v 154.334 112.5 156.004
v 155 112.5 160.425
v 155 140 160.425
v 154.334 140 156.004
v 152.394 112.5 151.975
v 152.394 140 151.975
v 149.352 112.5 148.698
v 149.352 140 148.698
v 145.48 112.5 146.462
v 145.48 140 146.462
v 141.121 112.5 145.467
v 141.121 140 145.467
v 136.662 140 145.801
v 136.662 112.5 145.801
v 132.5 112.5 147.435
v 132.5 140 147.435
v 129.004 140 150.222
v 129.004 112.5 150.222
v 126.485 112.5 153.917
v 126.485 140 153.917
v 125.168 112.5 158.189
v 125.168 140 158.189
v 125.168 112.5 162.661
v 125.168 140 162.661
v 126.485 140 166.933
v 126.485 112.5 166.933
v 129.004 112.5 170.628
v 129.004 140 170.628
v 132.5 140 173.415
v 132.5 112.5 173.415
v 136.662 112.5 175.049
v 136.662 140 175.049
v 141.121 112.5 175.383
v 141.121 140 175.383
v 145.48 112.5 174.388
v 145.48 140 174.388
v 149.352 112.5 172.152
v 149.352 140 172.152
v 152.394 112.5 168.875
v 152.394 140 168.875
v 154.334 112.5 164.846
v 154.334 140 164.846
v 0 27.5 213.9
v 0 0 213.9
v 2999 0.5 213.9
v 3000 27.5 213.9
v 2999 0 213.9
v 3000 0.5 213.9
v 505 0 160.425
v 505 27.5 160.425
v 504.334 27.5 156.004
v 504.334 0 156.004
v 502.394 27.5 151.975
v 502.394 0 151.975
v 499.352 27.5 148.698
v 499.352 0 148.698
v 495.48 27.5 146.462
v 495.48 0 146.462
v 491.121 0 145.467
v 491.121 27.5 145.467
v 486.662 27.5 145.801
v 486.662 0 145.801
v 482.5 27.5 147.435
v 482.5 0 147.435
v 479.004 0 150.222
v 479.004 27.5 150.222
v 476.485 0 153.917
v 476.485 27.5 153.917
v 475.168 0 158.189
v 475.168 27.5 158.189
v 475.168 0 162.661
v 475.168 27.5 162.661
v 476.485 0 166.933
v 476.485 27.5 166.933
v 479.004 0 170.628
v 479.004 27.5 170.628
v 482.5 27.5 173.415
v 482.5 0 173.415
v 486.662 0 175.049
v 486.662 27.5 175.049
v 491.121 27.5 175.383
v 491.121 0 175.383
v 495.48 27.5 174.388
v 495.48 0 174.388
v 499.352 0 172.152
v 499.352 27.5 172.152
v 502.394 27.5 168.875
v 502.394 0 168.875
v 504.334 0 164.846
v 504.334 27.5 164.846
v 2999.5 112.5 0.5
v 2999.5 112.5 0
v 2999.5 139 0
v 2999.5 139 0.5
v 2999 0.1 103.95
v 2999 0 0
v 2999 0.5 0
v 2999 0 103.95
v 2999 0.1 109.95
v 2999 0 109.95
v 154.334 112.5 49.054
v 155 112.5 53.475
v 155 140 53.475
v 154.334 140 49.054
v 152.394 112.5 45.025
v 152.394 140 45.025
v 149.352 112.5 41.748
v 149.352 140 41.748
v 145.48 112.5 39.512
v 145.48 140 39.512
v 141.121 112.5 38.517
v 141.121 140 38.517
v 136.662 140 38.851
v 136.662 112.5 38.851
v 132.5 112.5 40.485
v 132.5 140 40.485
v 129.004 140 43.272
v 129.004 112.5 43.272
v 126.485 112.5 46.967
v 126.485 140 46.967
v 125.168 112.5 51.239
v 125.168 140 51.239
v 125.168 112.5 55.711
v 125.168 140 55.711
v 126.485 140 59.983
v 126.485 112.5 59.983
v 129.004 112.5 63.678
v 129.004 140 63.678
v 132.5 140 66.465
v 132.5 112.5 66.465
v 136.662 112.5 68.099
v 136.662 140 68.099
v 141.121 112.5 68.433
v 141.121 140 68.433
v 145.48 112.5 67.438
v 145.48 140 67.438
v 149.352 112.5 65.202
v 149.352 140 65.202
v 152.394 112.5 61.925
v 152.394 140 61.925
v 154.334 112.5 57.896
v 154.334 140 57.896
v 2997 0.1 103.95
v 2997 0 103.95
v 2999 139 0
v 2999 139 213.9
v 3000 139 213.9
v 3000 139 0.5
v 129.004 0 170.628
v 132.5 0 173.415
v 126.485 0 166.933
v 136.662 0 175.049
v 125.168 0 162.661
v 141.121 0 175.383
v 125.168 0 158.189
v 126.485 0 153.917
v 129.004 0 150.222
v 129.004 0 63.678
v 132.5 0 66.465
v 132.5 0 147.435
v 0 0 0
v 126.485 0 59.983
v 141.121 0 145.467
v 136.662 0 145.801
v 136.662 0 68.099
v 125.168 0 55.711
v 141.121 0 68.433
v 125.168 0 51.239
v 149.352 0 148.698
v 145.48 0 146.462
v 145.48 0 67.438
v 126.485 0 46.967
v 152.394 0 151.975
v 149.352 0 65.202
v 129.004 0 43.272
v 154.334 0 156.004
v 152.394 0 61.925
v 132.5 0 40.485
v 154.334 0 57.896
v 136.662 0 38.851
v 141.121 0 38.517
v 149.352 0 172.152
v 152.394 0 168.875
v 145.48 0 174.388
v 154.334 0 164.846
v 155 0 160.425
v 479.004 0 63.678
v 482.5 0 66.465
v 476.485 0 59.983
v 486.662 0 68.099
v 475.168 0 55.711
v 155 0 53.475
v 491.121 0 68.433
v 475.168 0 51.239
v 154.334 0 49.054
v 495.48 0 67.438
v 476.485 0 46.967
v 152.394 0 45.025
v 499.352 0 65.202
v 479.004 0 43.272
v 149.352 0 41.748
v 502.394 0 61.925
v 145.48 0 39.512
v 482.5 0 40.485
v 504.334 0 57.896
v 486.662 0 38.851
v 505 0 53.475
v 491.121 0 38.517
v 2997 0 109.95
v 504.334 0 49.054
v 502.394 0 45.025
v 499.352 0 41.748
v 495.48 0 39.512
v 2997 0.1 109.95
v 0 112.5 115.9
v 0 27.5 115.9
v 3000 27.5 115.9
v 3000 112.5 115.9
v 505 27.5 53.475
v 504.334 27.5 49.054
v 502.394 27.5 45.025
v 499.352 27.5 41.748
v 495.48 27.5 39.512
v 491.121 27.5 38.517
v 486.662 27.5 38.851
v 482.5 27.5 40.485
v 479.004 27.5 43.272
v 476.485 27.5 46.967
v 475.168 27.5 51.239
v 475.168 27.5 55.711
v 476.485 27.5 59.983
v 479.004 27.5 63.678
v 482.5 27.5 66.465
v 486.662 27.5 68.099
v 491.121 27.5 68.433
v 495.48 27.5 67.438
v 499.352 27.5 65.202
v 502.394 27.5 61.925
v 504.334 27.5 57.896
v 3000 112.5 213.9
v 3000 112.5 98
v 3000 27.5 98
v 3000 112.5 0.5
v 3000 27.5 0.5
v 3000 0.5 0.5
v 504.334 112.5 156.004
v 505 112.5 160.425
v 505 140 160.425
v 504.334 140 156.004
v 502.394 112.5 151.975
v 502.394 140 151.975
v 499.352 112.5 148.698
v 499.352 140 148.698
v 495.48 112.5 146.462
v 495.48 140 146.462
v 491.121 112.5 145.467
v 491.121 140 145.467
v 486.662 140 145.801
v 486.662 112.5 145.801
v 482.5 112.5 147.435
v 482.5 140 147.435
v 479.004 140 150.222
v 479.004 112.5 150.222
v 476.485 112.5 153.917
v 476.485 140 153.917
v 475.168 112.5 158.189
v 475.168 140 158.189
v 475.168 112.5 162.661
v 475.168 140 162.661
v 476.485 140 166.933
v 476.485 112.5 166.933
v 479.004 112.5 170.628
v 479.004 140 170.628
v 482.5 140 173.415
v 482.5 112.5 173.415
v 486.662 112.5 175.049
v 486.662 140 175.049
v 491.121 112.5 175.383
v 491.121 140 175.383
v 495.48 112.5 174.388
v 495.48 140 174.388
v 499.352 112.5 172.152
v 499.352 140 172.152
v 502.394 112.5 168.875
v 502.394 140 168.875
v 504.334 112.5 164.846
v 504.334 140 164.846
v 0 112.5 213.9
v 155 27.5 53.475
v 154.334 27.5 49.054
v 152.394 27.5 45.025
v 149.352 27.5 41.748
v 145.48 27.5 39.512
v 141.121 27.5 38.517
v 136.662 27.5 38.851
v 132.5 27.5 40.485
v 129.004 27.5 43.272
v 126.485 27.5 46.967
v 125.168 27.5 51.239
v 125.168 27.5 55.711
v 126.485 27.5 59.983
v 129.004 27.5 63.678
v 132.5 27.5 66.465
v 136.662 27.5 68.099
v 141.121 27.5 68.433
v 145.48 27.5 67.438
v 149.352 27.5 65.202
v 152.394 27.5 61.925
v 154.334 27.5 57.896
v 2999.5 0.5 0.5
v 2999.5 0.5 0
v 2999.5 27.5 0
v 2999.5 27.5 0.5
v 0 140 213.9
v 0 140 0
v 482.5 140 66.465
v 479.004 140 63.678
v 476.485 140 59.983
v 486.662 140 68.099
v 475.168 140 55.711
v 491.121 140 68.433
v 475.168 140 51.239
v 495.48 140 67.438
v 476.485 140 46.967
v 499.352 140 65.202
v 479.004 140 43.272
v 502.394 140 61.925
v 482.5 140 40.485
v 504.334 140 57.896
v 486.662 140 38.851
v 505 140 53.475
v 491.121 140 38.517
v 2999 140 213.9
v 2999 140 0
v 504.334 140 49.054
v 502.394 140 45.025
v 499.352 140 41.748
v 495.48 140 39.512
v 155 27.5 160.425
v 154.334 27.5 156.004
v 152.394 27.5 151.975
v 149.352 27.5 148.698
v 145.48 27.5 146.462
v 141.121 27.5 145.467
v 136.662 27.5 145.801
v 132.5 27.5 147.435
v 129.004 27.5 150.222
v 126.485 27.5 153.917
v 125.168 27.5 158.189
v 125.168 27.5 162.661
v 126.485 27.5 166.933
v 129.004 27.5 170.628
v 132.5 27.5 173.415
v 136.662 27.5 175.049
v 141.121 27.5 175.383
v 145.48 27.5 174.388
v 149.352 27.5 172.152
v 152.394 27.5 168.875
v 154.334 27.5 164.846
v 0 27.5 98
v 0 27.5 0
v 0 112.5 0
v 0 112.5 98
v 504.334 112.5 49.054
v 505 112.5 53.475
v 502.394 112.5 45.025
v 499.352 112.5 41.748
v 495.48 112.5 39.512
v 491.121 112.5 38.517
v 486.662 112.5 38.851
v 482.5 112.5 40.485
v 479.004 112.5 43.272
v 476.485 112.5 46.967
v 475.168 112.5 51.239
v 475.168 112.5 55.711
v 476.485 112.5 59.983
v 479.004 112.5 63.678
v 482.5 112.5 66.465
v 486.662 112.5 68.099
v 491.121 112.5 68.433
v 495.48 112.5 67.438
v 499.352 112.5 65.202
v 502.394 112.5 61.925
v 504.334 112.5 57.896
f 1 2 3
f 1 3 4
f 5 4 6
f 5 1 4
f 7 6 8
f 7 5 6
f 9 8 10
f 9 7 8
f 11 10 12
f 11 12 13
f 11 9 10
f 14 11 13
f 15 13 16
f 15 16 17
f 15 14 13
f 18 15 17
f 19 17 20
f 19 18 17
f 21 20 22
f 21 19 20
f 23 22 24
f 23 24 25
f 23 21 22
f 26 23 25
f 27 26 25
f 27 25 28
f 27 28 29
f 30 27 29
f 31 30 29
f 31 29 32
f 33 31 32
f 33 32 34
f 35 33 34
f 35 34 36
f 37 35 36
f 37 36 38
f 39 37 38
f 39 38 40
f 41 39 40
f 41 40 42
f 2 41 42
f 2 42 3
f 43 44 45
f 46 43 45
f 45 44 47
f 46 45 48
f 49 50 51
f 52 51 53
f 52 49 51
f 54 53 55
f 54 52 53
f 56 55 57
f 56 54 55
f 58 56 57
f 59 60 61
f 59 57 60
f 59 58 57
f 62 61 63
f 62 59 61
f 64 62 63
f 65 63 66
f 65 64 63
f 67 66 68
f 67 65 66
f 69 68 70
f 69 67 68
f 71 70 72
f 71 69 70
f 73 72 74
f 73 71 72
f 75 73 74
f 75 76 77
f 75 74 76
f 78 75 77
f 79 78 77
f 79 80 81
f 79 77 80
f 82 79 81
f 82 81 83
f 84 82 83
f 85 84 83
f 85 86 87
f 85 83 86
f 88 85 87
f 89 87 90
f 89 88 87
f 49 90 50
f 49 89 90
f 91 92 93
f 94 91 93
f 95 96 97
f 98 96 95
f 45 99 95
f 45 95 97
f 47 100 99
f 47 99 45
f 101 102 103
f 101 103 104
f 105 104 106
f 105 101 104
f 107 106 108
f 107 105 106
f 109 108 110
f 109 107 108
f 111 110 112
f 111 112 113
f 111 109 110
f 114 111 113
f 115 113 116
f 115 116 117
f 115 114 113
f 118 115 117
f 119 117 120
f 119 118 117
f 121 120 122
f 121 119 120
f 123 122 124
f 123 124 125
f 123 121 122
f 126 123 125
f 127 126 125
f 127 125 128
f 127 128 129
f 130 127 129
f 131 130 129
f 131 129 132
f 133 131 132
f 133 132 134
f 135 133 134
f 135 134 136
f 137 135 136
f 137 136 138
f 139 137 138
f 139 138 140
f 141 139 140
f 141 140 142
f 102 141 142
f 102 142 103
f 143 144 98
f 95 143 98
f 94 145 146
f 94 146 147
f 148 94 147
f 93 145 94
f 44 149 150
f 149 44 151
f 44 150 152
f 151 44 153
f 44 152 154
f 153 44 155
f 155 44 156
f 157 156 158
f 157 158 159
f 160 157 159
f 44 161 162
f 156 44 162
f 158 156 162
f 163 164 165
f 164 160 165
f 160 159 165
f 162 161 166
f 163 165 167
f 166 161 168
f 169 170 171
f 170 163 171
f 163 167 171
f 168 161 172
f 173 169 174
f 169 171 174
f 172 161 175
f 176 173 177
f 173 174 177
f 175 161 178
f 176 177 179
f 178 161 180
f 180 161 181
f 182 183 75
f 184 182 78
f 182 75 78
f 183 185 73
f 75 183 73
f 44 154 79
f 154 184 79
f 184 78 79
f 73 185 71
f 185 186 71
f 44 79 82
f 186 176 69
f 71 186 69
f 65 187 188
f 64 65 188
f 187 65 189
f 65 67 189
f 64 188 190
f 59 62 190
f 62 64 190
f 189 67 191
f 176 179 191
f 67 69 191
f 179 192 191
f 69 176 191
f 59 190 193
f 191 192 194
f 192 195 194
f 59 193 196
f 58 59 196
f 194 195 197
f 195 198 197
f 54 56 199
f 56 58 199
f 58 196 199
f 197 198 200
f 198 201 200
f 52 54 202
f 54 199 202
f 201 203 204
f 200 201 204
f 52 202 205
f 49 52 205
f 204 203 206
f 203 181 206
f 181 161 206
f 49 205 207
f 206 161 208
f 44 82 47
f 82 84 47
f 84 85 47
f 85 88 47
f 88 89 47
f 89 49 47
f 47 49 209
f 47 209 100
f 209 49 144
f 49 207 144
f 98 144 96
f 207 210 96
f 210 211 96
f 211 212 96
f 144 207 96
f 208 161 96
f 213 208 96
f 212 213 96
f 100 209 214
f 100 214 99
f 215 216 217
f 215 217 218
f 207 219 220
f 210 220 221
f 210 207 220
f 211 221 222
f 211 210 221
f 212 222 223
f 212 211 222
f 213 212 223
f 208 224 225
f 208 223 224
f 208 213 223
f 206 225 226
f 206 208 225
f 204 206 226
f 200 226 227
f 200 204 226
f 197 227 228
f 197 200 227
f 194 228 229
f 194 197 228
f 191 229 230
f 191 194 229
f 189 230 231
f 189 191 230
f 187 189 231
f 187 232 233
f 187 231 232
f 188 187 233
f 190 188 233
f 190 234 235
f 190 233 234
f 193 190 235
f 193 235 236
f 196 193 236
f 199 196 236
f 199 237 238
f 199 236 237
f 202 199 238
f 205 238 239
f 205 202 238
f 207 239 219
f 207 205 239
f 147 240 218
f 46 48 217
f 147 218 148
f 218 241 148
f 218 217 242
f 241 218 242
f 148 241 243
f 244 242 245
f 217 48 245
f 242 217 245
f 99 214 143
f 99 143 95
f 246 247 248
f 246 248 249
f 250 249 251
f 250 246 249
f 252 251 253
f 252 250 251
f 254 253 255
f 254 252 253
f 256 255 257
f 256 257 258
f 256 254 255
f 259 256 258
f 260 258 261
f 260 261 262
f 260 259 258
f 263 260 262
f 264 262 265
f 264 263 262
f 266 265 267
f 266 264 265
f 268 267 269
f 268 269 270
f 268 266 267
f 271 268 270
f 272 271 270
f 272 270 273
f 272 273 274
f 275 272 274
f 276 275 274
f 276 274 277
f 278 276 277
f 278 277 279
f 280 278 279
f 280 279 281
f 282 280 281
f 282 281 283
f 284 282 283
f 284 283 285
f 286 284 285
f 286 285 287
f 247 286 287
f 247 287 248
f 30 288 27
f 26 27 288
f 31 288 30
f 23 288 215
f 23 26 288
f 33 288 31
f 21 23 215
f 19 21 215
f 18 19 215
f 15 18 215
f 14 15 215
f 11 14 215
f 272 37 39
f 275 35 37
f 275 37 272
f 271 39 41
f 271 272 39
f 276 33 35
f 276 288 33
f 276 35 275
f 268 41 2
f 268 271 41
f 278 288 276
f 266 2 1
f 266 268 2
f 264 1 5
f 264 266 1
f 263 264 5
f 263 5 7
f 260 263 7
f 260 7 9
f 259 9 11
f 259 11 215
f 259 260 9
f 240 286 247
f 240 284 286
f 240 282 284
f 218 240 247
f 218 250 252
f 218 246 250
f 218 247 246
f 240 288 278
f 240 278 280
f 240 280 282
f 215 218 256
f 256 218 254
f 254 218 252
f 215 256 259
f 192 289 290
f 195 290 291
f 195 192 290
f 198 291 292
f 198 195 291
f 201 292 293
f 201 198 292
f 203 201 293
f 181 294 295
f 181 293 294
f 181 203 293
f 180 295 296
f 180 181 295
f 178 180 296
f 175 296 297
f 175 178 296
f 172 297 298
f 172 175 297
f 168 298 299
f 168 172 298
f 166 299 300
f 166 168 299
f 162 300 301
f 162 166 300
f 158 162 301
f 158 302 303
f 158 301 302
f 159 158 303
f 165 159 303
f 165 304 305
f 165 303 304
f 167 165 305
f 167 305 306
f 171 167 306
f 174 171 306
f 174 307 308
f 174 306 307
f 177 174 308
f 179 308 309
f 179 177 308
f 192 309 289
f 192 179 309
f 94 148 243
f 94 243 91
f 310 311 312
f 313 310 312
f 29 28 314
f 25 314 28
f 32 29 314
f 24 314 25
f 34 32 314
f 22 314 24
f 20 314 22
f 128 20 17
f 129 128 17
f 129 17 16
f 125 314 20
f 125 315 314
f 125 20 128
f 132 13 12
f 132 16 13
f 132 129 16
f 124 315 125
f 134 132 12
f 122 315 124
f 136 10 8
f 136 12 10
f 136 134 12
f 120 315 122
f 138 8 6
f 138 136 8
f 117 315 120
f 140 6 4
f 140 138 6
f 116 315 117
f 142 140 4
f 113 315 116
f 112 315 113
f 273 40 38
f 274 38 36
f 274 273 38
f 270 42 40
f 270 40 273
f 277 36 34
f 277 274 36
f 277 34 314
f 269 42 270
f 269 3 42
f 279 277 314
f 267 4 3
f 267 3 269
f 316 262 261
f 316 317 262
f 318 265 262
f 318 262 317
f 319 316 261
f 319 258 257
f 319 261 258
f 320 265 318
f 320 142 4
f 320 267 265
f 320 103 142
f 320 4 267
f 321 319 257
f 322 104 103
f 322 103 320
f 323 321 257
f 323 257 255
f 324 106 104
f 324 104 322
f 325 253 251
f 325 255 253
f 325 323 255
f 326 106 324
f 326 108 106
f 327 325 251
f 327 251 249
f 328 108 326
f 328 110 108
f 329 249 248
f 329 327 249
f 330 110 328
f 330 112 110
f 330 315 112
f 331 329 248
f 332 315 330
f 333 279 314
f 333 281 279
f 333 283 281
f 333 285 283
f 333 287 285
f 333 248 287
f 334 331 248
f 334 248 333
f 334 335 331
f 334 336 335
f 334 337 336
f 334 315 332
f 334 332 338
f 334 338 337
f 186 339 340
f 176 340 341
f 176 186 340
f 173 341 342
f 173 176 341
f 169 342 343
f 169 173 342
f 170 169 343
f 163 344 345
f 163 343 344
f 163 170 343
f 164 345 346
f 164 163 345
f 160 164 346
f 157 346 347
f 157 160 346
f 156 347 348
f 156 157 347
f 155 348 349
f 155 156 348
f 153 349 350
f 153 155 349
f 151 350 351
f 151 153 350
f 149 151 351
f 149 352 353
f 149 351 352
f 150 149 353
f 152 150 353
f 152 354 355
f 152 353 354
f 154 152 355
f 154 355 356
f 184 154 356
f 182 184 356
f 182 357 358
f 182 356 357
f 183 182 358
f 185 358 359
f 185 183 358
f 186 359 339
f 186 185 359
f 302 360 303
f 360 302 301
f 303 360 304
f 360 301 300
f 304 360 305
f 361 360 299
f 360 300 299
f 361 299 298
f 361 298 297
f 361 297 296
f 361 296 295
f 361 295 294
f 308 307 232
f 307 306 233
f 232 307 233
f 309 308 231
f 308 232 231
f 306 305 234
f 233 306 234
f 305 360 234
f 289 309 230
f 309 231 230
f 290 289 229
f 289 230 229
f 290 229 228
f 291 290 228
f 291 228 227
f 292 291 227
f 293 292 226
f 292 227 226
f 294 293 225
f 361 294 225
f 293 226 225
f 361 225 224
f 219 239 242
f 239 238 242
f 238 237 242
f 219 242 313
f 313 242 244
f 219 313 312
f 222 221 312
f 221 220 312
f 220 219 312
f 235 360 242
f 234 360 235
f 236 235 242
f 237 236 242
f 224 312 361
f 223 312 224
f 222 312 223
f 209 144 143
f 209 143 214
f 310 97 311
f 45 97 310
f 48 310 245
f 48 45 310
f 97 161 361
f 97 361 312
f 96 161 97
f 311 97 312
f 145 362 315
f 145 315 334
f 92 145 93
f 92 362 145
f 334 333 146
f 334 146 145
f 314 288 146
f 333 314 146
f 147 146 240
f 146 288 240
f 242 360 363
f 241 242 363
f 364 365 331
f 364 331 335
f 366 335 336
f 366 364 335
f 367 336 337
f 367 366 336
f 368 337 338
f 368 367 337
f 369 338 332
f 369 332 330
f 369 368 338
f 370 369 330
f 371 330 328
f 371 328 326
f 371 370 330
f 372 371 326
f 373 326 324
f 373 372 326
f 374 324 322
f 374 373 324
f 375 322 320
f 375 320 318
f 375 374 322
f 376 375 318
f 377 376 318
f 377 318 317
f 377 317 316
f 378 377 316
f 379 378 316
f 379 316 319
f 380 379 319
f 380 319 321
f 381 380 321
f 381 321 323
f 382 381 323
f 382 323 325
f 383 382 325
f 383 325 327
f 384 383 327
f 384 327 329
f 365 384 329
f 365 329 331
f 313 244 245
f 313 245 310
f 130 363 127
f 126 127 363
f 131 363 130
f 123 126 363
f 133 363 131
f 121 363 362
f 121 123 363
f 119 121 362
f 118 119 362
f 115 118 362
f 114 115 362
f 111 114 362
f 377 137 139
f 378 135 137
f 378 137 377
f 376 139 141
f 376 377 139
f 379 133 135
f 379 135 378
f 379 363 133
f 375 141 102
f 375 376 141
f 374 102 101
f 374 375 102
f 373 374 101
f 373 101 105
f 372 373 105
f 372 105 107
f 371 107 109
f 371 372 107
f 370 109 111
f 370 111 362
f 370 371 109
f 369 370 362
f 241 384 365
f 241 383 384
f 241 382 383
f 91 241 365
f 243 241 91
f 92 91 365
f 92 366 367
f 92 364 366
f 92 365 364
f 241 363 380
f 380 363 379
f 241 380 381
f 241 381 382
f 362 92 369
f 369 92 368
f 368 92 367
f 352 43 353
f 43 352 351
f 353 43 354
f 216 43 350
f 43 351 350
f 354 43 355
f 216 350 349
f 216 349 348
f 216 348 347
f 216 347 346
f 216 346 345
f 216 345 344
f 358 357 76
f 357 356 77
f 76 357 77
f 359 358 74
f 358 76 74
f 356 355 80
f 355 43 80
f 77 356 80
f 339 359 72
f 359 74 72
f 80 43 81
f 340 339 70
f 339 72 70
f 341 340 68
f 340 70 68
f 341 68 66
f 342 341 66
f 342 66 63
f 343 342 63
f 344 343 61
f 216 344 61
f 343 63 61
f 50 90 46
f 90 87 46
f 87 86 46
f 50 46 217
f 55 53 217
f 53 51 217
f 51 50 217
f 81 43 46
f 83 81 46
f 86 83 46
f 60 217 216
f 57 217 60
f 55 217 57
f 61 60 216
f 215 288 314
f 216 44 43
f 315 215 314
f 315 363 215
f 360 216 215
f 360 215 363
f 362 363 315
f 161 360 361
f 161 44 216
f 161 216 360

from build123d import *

# Parameters (mm, degrees)
SKETCH1_W           = 3000
SKETCH1_H           = 213.9
SKETCH1_R           = 15
BOSS_EXTRUDE1_DEPTH = 140
SKETCH2_W           = 3
SKETCH2_H           = 6
CUT_EXTRUDE1_DEPTH  = 0.1
SKETCH4_W           = 98
SKETCH4_H           = 85
CUT_EXTRUDE3_DEPTH  = 3001
SKETCH5_W           = 1
SKETCH5_H           = 213.9
CUT_EXTRUDE4_DEPTH  = 1
SKETCH6_W           = 0.5
SKETCH6_H           = 139
CUT_EXTRUDE5_DEPTH  = 0.5
SKETCH7_W           = 1
SKETCH7_H           = 213.9
CUT_EXTRUDE6_DEPTH  = 0.5


with BuildPart() as part:
    # Sketch1 → Boss-Extrude1 (new body)
    with BuildSketch(Plane(origin=(0, 0, 0), x_dir=(1, 0, 0), z_dir=(0, 1, 0))):
        with Locations((1500, -106.95)):
            Rectangle(SKETCH1_W, SKETCH1_H)
        with Locations((140, -53.475)):
            Circle(SKETCH1_R, mode=Mode.SUBTRACT)
        with Locations((140, -160.425)):
            Circle(SKETCH1_R, mode=Mode.SUBTRACT)
        with Locations((490, -53.475)):
            Circle(SKETCH1_R, mode=Mode.SUBTRACT)
        with Locations((490, -160.425)):
            Circle(SKETCH1_R, mode=Mode.SUBTRACT)
    extrude(amount=BOSS_EXTRUDE1_DEPTH)

    # Sketch2 → Cut-Extrude1 (cut)
    with BuildSketch(Plane.XZ):
        with Locations((2998.5, 106.95)):
            Rectangle(SKETCH2_W, SKETCH2_H)
    extrude(amount=-CUT_EXTRUDE1_DEPTH, mode=Mode.SUBTRACT)

    # Sketch4 → Cut-Extrude3 (cut, through all)
    with BuildSketch(Plane(origin=(3000, 0, 0), x_dir=(0, 0, -1), z_dir=(1, 0, 0))):
        with Locations((-164.9, 70)):
            Rectangle(SKETCH4_W, SKETCH4_H)
        with Locations((-49, 70)):
            Rectangle(SKETCH4_W, SKETCH4_H)
    extrude(amount=-CUT_EXTRUDE3_DEPTH, mode=Mode.SUBTRACT)

    # Sketch5 → Cut-Extrude4 (cut)
    with BuildSketch(Plane(origin=(0, 140, 0), x_dir=(1, 0, 0), z_dir=(0, 1, 0))):
        with Locations((2999.5, -106.95)):
            Rectangle(SKETCH5_W, SKETCH5_H)
    extrude(amount=-CUT_EXTRUDE4_DEPTH, mode=Mode.SUBTRACT)

    # Sketch6 → Cut-Extrude5 (cut)
    with BuildSketch(Plane(origin=(0, 0, 0), x_dir=(-1, 0, 0), z_dir=(0, 0, -1))):
        with Locations((-2999.75, 69.5)):
            Rectangle(SKETCH6_W, SKETCH6_H)
    extrude(amount=-CUT_EXTRUDE5_DEPTH, mode=Mode.SUBTRACT)

    # Sketch7 → Cut-Extrude6 (cut)
    with BuildSketch(Plane.XZ):
        with Locations((2999.5, 106.95)):
            Rectangle(SKETCH7_W, SKETCH7_H)
    extrude(amount=-CUT_EXTRUDE6_DEPTH, mode=Mode.SUBTRACT)


solid = part.part
